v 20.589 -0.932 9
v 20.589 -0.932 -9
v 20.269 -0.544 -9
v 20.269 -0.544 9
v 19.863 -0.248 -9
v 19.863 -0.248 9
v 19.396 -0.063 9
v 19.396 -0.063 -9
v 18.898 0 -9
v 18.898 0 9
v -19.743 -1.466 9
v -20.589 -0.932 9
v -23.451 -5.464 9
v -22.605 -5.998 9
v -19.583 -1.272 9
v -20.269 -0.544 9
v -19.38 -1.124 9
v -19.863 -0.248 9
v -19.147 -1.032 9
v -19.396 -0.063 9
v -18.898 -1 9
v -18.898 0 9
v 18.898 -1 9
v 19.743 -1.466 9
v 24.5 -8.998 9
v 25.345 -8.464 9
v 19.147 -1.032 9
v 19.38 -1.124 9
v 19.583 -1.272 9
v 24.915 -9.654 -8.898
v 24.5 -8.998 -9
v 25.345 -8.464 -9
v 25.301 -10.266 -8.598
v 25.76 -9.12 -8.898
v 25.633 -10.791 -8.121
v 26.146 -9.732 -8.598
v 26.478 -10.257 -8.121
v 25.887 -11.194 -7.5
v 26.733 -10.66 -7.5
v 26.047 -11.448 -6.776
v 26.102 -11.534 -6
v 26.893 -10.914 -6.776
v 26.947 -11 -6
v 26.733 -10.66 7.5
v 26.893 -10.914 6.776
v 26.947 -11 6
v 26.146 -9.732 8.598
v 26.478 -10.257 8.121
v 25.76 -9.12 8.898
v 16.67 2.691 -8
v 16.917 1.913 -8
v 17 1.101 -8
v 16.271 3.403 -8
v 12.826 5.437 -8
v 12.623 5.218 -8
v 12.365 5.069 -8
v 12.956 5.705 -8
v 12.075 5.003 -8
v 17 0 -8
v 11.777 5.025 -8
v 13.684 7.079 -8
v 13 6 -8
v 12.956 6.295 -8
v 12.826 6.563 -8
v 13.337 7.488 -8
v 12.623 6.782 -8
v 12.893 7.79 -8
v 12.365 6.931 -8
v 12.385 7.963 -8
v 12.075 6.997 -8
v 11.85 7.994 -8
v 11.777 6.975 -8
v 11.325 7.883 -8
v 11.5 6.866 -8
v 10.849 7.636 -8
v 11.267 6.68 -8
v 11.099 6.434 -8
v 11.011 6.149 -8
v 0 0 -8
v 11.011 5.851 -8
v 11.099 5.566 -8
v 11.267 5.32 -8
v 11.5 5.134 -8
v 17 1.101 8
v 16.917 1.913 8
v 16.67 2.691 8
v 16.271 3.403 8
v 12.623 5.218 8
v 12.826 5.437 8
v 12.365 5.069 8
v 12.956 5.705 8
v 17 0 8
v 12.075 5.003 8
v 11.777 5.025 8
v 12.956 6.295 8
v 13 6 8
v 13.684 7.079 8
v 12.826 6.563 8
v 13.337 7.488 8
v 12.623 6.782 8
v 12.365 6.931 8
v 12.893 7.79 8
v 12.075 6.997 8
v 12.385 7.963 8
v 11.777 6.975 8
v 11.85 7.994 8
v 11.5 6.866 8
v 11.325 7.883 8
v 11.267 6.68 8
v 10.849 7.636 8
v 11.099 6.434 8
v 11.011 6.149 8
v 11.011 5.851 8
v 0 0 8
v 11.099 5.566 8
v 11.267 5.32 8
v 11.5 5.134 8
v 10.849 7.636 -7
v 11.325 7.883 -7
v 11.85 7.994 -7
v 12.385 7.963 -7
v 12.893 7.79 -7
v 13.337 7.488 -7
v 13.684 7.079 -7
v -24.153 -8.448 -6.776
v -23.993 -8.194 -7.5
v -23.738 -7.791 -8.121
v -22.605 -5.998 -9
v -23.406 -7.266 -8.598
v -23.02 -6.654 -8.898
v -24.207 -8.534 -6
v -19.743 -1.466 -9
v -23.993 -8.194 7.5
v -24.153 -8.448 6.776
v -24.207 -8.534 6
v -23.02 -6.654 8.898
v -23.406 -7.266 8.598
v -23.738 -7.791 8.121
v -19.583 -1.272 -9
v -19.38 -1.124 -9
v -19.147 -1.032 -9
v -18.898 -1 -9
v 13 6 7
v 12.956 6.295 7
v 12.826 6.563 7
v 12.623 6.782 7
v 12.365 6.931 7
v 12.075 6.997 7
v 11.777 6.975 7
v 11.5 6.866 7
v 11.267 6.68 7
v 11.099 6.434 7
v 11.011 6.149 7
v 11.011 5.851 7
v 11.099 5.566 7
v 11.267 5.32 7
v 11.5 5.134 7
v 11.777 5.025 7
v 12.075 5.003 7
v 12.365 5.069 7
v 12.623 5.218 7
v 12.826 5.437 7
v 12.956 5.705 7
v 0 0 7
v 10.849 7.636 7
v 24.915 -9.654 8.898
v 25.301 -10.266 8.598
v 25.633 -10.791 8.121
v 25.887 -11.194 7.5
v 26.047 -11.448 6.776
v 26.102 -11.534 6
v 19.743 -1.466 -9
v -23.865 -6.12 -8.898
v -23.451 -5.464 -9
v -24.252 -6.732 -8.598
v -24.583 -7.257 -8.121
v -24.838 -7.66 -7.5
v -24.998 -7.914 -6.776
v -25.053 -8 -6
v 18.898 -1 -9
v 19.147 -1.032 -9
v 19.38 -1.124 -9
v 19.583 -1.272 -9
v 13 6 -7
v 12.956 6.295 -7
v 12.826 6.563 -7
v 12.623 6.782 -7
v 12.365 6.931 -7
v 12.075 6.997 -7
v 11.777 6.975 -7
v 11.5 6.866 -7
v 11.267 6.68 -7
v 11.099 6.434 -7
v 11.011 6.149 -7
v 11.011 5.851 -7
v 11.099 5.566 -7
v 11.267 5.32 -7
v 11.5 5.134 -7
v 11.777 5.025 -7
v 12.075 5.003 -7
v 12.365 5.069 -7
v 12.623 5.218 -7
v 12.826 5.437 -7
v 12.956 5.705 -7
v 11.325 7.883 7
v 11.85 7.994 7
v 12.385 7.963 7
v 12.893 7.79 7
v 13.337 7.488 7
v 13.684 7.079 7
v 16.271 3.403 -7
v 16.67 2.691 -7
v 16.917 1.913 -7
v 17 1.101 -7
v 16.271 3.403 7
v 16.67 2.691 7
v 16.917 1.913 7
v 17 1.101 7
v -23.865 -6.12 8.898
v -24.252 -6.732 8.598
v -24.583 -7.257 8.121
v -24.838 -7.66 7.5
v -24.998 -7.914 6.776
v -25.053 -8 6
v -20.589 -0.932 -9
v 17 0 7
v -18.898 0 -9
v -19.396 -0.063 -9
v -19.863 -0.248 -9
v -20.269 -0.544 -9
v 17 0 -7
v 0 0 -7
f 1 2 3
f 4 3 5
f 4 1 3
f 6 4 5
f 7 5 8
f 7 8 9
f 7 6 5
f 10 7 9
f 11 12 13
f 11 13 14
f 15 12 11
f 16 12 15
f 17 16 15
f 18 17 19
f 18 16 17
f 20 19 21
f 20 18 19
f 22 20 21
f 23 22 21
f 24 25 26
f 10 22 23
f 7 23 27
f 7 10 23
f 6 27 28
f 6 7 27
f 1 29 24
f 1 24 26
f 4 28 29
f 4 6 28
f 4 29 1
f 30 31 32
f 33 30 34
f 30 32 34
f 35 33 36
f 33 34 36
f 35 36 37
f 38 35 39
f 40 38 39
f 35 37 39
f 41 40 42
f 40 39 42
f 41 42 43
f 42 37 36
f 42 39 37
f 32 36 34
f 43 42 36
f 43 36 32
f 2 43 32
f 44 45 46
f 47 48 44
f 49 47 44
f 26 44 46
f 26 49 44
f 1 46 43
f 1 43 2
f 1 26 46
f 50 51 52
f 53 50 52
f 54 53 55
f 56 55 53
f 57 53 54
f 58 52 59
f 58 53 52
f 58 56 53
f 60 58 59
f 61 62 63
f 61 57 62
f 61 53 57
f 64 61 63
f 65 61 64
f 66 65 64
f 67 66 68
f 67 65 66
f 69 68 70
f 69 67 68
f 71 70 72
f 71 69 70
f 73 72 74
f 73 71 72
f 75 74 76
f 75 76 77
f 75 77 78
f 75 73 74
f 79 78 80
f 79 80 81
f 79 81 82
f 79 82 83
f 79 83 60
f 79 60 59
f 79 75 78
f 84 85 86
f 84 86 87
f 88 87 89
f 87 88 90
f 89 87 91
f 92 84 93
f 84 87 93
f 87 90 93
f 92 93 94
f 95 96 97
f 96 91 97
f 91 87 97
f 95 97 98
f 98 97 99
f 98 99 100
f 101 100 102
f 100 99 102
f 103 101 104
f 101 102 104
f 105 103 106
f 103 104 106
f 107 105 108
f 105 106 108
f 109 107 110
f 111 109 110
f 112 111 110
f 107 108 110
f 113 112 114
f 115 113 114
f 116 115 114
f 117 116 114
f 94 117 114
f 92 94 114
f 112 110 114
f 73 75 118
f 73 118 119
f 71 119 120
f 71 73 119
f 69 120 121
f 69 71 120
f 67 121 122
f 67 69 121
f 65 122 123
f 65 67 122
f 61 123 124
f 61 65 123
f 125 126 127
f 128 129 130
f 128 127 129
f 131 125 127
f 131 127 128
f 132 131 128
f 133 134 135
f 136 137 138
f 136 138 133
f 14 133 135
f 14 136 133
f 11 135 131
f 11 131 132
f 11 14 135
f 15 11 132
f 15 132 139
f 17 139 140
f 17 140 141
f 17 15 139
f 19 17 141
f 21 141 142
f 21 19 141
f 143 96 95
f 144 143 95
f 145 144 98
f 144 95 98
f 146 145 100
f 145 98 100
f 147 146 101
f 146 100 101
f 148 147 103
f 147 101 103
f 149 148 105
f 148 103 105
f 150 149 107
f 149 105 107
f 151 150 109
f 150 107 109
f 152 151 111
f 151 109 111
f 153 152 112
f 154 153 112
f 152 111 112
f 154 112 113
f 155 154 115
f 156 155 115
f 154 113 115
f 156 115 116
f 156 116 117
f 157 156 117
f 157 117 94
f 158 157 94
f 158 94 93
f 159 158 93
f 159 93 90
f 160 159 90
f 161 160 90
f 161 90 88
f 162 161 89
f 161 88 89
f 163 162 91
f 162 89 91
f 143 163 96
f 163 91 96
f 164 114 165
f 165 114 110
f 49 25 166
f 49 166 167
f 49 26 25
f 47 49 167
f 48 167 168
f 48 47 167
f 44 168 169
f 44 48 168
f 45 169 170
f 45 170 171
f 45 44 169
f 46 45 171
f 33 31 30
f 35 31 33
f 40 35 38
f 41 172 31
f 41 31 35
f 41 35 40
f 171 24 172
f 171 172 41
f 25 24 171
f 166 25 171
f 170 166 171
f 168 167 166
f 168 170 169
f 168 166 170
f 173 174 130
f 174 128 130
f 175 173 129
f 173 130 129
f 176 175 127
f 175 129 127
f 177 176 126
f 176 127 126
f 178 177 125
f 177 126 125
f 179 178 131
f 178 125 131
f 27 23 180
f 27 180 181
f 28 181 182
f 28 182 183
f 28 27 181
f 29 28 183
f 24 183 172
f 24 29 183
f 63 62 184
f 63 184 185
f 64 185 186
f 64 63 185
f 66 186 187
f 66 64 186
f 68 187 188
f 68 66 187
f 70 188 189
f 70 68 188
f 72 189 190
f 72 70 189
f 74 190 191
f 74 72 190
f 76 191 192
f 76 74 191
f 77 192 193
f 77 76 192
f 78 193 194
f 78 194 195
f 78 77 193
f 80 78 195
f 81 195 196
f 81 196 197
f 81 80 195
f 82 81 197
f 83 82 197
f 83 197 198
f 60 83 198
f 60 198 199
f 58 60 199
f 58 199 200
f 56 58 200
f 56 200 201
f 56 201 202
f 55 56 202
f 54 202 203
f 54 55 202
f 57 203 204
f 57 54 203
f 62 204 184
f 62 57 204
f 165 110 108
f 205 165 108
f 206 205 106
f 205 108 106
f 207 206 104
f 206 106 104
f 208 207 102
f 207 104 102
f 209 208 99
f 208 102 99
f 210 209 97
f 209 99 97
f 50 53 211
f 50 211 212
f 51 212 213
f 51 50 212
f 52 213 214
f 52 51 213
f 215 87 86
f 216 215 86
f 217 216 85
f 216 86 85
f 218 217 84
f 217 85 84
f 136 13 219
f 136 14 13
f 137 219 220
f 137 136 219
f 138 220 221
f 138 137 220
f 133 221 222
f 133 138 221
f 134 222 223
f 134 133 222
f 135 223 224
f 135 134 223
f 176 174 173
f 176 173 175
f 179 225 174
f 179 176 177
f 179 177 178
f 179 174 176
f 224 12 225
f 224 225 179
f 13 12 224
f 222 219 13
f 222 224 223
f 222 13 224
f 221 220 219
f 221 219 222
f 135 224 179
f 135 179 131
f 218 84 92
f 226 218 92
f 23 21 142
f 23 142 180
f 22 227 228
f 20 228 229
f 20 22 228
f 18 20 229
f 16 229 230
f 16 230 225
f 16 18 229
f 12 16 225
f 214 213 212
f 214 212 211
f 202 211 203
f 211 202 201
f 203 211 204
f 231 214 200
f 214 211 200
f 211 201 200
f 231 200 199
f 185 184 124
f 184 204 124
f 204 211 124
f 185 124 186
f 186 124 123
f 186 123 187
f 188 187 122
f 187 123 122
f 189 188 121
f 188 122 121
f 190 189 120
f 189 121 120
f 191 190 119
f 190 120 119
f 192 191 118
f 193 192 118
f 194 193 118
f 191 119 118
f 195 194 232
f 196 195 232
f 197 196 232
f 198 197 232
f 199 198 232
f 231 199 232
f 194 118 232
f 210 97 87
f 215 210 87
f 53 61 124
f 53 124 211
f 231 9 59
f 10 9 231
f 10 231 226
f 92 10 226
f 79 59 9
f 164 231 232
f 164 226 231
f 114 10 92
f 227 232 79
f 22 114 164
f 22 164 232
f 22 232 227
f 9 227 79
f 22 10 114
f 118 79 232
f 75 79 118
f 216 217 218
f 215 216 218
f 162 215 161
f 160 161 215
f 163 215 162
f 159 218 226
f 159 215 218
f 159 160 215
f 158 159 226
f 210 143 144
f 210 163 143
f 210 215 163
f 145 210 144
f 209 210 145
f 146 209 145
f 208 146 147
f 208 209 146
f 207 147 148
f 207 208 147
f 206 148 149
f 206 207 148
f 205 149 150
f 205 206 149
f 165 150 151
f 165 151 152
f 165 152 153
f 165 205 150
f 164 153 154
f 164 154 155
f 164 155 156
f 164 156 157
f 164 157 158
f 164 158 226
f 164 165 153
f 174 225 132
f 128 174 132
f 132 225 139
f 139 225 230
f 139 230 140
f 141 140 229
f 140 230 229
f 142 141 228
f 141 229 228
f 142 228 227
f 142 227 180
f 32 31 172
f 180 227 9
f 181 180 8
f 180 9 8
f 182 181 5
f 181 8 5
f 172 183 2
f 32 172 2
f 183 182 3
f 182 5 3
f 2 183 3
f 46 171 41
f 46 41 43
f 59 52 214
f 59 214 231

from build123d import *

# Parameters (mm, degrees)
BOSS_EXTRUDE1_DEPTH = 9
BOSS_EXTRUDE2_START = -8
SKETCH3_R           = 1
BOSS_EXTRUDE2_DEPTH = 1
FILLET3_R           = 3


with BuildPart() as part:
    # Sketch1 → Boss-Extrude1 (new, symmetric)
    with BuildSketch(Plane.XY):
        with BuildLine():
            Line((18.897662626, 0), (-18.897662626, 0))
            ThreePointArc((-18.897662626, 0), (-19.863071357, -0.248433278), (-20.588640432, -0.932014017))
            Line((-20.588640432, -0.932014017), (-25.052631579, -8))
            Line((-25.052631579, -8), (-24.207142676, -8.533992991))
            Line((-24.207142676, -8.533992991), (-19.743151529, -1.466007009))
            ThreePointArc((-19.743151529, -1.466007009), (-19.380366991, -1.124216639), (-18.897662626, -1))
            Line((-18.897662626, -1), (18.897662626, -1))
            ThreePointArc((18.897662626, -1), (19.380366991, -1.124216639), (19.743151529, -1.466007009))
            Line((19.743151529, -1.466007009), (26.101879518, -11.533992991))
            Line((26.101879518, -11.533992991), (26.947368421, -11))
            Line((26.947368421, -11), (20.588640432, -0.932014017))
            ThreePointArc((20.588640432, -0.932014017), (19.863071357, -0.248433278), (18.897662626, 0))
        make_face()
    extrude(amount=BOSS_EXTRUDE1_DEPTH, both=True)

    # Sketch3 → Boss-Extrude2 (add)
    with BuildSketch(Plane.XY.offset(BOSS_EXTRUDE2_START)):
        with BuildLine():
            Line((0, 0), (10.848900056, 7.635533222))
            ThreePointArc((10.848900056, 7.635533222), (12.385192628, 7.962556149), (13.683904275, 7.07910444))
            Line((13.683904275, 7.07910444), (16.271066443, 3.403151108))
            ThreePointArc((16.271066443, 3.403151108), (16.813414859, 2.3083729), (17, 1.10095122))
            Line((17, 1.10095122), (17, 0))
            Line((17, 0), (0, 0))
        make_face()
        with Locations((12, 6)):
            Circle(SKETCH3_R, mode=Mode.SUBTRACT)
    boss_extrude2 = extrude(amount=BOSS_EXTRUDE2_DEPTH)

    # Mirror1: Boss-Extrude2 across plane
    add(boss_extrude2.mirror(Plane.XY))

    # Fillet3
    fillet3_edges = [part.edges().sort_by_distance(p)[0] for p in [
        (26.52462397, -11.266996496, 9),
        (-24.629887127, -8.266996496, -9),
        (26.52462397, -11.266996496, -9),
        (-24.629887127, -8.266996496, 9),
    ]]
    fillet(fillet3_edges, radius=FILLET3_R)


solid = part.part
